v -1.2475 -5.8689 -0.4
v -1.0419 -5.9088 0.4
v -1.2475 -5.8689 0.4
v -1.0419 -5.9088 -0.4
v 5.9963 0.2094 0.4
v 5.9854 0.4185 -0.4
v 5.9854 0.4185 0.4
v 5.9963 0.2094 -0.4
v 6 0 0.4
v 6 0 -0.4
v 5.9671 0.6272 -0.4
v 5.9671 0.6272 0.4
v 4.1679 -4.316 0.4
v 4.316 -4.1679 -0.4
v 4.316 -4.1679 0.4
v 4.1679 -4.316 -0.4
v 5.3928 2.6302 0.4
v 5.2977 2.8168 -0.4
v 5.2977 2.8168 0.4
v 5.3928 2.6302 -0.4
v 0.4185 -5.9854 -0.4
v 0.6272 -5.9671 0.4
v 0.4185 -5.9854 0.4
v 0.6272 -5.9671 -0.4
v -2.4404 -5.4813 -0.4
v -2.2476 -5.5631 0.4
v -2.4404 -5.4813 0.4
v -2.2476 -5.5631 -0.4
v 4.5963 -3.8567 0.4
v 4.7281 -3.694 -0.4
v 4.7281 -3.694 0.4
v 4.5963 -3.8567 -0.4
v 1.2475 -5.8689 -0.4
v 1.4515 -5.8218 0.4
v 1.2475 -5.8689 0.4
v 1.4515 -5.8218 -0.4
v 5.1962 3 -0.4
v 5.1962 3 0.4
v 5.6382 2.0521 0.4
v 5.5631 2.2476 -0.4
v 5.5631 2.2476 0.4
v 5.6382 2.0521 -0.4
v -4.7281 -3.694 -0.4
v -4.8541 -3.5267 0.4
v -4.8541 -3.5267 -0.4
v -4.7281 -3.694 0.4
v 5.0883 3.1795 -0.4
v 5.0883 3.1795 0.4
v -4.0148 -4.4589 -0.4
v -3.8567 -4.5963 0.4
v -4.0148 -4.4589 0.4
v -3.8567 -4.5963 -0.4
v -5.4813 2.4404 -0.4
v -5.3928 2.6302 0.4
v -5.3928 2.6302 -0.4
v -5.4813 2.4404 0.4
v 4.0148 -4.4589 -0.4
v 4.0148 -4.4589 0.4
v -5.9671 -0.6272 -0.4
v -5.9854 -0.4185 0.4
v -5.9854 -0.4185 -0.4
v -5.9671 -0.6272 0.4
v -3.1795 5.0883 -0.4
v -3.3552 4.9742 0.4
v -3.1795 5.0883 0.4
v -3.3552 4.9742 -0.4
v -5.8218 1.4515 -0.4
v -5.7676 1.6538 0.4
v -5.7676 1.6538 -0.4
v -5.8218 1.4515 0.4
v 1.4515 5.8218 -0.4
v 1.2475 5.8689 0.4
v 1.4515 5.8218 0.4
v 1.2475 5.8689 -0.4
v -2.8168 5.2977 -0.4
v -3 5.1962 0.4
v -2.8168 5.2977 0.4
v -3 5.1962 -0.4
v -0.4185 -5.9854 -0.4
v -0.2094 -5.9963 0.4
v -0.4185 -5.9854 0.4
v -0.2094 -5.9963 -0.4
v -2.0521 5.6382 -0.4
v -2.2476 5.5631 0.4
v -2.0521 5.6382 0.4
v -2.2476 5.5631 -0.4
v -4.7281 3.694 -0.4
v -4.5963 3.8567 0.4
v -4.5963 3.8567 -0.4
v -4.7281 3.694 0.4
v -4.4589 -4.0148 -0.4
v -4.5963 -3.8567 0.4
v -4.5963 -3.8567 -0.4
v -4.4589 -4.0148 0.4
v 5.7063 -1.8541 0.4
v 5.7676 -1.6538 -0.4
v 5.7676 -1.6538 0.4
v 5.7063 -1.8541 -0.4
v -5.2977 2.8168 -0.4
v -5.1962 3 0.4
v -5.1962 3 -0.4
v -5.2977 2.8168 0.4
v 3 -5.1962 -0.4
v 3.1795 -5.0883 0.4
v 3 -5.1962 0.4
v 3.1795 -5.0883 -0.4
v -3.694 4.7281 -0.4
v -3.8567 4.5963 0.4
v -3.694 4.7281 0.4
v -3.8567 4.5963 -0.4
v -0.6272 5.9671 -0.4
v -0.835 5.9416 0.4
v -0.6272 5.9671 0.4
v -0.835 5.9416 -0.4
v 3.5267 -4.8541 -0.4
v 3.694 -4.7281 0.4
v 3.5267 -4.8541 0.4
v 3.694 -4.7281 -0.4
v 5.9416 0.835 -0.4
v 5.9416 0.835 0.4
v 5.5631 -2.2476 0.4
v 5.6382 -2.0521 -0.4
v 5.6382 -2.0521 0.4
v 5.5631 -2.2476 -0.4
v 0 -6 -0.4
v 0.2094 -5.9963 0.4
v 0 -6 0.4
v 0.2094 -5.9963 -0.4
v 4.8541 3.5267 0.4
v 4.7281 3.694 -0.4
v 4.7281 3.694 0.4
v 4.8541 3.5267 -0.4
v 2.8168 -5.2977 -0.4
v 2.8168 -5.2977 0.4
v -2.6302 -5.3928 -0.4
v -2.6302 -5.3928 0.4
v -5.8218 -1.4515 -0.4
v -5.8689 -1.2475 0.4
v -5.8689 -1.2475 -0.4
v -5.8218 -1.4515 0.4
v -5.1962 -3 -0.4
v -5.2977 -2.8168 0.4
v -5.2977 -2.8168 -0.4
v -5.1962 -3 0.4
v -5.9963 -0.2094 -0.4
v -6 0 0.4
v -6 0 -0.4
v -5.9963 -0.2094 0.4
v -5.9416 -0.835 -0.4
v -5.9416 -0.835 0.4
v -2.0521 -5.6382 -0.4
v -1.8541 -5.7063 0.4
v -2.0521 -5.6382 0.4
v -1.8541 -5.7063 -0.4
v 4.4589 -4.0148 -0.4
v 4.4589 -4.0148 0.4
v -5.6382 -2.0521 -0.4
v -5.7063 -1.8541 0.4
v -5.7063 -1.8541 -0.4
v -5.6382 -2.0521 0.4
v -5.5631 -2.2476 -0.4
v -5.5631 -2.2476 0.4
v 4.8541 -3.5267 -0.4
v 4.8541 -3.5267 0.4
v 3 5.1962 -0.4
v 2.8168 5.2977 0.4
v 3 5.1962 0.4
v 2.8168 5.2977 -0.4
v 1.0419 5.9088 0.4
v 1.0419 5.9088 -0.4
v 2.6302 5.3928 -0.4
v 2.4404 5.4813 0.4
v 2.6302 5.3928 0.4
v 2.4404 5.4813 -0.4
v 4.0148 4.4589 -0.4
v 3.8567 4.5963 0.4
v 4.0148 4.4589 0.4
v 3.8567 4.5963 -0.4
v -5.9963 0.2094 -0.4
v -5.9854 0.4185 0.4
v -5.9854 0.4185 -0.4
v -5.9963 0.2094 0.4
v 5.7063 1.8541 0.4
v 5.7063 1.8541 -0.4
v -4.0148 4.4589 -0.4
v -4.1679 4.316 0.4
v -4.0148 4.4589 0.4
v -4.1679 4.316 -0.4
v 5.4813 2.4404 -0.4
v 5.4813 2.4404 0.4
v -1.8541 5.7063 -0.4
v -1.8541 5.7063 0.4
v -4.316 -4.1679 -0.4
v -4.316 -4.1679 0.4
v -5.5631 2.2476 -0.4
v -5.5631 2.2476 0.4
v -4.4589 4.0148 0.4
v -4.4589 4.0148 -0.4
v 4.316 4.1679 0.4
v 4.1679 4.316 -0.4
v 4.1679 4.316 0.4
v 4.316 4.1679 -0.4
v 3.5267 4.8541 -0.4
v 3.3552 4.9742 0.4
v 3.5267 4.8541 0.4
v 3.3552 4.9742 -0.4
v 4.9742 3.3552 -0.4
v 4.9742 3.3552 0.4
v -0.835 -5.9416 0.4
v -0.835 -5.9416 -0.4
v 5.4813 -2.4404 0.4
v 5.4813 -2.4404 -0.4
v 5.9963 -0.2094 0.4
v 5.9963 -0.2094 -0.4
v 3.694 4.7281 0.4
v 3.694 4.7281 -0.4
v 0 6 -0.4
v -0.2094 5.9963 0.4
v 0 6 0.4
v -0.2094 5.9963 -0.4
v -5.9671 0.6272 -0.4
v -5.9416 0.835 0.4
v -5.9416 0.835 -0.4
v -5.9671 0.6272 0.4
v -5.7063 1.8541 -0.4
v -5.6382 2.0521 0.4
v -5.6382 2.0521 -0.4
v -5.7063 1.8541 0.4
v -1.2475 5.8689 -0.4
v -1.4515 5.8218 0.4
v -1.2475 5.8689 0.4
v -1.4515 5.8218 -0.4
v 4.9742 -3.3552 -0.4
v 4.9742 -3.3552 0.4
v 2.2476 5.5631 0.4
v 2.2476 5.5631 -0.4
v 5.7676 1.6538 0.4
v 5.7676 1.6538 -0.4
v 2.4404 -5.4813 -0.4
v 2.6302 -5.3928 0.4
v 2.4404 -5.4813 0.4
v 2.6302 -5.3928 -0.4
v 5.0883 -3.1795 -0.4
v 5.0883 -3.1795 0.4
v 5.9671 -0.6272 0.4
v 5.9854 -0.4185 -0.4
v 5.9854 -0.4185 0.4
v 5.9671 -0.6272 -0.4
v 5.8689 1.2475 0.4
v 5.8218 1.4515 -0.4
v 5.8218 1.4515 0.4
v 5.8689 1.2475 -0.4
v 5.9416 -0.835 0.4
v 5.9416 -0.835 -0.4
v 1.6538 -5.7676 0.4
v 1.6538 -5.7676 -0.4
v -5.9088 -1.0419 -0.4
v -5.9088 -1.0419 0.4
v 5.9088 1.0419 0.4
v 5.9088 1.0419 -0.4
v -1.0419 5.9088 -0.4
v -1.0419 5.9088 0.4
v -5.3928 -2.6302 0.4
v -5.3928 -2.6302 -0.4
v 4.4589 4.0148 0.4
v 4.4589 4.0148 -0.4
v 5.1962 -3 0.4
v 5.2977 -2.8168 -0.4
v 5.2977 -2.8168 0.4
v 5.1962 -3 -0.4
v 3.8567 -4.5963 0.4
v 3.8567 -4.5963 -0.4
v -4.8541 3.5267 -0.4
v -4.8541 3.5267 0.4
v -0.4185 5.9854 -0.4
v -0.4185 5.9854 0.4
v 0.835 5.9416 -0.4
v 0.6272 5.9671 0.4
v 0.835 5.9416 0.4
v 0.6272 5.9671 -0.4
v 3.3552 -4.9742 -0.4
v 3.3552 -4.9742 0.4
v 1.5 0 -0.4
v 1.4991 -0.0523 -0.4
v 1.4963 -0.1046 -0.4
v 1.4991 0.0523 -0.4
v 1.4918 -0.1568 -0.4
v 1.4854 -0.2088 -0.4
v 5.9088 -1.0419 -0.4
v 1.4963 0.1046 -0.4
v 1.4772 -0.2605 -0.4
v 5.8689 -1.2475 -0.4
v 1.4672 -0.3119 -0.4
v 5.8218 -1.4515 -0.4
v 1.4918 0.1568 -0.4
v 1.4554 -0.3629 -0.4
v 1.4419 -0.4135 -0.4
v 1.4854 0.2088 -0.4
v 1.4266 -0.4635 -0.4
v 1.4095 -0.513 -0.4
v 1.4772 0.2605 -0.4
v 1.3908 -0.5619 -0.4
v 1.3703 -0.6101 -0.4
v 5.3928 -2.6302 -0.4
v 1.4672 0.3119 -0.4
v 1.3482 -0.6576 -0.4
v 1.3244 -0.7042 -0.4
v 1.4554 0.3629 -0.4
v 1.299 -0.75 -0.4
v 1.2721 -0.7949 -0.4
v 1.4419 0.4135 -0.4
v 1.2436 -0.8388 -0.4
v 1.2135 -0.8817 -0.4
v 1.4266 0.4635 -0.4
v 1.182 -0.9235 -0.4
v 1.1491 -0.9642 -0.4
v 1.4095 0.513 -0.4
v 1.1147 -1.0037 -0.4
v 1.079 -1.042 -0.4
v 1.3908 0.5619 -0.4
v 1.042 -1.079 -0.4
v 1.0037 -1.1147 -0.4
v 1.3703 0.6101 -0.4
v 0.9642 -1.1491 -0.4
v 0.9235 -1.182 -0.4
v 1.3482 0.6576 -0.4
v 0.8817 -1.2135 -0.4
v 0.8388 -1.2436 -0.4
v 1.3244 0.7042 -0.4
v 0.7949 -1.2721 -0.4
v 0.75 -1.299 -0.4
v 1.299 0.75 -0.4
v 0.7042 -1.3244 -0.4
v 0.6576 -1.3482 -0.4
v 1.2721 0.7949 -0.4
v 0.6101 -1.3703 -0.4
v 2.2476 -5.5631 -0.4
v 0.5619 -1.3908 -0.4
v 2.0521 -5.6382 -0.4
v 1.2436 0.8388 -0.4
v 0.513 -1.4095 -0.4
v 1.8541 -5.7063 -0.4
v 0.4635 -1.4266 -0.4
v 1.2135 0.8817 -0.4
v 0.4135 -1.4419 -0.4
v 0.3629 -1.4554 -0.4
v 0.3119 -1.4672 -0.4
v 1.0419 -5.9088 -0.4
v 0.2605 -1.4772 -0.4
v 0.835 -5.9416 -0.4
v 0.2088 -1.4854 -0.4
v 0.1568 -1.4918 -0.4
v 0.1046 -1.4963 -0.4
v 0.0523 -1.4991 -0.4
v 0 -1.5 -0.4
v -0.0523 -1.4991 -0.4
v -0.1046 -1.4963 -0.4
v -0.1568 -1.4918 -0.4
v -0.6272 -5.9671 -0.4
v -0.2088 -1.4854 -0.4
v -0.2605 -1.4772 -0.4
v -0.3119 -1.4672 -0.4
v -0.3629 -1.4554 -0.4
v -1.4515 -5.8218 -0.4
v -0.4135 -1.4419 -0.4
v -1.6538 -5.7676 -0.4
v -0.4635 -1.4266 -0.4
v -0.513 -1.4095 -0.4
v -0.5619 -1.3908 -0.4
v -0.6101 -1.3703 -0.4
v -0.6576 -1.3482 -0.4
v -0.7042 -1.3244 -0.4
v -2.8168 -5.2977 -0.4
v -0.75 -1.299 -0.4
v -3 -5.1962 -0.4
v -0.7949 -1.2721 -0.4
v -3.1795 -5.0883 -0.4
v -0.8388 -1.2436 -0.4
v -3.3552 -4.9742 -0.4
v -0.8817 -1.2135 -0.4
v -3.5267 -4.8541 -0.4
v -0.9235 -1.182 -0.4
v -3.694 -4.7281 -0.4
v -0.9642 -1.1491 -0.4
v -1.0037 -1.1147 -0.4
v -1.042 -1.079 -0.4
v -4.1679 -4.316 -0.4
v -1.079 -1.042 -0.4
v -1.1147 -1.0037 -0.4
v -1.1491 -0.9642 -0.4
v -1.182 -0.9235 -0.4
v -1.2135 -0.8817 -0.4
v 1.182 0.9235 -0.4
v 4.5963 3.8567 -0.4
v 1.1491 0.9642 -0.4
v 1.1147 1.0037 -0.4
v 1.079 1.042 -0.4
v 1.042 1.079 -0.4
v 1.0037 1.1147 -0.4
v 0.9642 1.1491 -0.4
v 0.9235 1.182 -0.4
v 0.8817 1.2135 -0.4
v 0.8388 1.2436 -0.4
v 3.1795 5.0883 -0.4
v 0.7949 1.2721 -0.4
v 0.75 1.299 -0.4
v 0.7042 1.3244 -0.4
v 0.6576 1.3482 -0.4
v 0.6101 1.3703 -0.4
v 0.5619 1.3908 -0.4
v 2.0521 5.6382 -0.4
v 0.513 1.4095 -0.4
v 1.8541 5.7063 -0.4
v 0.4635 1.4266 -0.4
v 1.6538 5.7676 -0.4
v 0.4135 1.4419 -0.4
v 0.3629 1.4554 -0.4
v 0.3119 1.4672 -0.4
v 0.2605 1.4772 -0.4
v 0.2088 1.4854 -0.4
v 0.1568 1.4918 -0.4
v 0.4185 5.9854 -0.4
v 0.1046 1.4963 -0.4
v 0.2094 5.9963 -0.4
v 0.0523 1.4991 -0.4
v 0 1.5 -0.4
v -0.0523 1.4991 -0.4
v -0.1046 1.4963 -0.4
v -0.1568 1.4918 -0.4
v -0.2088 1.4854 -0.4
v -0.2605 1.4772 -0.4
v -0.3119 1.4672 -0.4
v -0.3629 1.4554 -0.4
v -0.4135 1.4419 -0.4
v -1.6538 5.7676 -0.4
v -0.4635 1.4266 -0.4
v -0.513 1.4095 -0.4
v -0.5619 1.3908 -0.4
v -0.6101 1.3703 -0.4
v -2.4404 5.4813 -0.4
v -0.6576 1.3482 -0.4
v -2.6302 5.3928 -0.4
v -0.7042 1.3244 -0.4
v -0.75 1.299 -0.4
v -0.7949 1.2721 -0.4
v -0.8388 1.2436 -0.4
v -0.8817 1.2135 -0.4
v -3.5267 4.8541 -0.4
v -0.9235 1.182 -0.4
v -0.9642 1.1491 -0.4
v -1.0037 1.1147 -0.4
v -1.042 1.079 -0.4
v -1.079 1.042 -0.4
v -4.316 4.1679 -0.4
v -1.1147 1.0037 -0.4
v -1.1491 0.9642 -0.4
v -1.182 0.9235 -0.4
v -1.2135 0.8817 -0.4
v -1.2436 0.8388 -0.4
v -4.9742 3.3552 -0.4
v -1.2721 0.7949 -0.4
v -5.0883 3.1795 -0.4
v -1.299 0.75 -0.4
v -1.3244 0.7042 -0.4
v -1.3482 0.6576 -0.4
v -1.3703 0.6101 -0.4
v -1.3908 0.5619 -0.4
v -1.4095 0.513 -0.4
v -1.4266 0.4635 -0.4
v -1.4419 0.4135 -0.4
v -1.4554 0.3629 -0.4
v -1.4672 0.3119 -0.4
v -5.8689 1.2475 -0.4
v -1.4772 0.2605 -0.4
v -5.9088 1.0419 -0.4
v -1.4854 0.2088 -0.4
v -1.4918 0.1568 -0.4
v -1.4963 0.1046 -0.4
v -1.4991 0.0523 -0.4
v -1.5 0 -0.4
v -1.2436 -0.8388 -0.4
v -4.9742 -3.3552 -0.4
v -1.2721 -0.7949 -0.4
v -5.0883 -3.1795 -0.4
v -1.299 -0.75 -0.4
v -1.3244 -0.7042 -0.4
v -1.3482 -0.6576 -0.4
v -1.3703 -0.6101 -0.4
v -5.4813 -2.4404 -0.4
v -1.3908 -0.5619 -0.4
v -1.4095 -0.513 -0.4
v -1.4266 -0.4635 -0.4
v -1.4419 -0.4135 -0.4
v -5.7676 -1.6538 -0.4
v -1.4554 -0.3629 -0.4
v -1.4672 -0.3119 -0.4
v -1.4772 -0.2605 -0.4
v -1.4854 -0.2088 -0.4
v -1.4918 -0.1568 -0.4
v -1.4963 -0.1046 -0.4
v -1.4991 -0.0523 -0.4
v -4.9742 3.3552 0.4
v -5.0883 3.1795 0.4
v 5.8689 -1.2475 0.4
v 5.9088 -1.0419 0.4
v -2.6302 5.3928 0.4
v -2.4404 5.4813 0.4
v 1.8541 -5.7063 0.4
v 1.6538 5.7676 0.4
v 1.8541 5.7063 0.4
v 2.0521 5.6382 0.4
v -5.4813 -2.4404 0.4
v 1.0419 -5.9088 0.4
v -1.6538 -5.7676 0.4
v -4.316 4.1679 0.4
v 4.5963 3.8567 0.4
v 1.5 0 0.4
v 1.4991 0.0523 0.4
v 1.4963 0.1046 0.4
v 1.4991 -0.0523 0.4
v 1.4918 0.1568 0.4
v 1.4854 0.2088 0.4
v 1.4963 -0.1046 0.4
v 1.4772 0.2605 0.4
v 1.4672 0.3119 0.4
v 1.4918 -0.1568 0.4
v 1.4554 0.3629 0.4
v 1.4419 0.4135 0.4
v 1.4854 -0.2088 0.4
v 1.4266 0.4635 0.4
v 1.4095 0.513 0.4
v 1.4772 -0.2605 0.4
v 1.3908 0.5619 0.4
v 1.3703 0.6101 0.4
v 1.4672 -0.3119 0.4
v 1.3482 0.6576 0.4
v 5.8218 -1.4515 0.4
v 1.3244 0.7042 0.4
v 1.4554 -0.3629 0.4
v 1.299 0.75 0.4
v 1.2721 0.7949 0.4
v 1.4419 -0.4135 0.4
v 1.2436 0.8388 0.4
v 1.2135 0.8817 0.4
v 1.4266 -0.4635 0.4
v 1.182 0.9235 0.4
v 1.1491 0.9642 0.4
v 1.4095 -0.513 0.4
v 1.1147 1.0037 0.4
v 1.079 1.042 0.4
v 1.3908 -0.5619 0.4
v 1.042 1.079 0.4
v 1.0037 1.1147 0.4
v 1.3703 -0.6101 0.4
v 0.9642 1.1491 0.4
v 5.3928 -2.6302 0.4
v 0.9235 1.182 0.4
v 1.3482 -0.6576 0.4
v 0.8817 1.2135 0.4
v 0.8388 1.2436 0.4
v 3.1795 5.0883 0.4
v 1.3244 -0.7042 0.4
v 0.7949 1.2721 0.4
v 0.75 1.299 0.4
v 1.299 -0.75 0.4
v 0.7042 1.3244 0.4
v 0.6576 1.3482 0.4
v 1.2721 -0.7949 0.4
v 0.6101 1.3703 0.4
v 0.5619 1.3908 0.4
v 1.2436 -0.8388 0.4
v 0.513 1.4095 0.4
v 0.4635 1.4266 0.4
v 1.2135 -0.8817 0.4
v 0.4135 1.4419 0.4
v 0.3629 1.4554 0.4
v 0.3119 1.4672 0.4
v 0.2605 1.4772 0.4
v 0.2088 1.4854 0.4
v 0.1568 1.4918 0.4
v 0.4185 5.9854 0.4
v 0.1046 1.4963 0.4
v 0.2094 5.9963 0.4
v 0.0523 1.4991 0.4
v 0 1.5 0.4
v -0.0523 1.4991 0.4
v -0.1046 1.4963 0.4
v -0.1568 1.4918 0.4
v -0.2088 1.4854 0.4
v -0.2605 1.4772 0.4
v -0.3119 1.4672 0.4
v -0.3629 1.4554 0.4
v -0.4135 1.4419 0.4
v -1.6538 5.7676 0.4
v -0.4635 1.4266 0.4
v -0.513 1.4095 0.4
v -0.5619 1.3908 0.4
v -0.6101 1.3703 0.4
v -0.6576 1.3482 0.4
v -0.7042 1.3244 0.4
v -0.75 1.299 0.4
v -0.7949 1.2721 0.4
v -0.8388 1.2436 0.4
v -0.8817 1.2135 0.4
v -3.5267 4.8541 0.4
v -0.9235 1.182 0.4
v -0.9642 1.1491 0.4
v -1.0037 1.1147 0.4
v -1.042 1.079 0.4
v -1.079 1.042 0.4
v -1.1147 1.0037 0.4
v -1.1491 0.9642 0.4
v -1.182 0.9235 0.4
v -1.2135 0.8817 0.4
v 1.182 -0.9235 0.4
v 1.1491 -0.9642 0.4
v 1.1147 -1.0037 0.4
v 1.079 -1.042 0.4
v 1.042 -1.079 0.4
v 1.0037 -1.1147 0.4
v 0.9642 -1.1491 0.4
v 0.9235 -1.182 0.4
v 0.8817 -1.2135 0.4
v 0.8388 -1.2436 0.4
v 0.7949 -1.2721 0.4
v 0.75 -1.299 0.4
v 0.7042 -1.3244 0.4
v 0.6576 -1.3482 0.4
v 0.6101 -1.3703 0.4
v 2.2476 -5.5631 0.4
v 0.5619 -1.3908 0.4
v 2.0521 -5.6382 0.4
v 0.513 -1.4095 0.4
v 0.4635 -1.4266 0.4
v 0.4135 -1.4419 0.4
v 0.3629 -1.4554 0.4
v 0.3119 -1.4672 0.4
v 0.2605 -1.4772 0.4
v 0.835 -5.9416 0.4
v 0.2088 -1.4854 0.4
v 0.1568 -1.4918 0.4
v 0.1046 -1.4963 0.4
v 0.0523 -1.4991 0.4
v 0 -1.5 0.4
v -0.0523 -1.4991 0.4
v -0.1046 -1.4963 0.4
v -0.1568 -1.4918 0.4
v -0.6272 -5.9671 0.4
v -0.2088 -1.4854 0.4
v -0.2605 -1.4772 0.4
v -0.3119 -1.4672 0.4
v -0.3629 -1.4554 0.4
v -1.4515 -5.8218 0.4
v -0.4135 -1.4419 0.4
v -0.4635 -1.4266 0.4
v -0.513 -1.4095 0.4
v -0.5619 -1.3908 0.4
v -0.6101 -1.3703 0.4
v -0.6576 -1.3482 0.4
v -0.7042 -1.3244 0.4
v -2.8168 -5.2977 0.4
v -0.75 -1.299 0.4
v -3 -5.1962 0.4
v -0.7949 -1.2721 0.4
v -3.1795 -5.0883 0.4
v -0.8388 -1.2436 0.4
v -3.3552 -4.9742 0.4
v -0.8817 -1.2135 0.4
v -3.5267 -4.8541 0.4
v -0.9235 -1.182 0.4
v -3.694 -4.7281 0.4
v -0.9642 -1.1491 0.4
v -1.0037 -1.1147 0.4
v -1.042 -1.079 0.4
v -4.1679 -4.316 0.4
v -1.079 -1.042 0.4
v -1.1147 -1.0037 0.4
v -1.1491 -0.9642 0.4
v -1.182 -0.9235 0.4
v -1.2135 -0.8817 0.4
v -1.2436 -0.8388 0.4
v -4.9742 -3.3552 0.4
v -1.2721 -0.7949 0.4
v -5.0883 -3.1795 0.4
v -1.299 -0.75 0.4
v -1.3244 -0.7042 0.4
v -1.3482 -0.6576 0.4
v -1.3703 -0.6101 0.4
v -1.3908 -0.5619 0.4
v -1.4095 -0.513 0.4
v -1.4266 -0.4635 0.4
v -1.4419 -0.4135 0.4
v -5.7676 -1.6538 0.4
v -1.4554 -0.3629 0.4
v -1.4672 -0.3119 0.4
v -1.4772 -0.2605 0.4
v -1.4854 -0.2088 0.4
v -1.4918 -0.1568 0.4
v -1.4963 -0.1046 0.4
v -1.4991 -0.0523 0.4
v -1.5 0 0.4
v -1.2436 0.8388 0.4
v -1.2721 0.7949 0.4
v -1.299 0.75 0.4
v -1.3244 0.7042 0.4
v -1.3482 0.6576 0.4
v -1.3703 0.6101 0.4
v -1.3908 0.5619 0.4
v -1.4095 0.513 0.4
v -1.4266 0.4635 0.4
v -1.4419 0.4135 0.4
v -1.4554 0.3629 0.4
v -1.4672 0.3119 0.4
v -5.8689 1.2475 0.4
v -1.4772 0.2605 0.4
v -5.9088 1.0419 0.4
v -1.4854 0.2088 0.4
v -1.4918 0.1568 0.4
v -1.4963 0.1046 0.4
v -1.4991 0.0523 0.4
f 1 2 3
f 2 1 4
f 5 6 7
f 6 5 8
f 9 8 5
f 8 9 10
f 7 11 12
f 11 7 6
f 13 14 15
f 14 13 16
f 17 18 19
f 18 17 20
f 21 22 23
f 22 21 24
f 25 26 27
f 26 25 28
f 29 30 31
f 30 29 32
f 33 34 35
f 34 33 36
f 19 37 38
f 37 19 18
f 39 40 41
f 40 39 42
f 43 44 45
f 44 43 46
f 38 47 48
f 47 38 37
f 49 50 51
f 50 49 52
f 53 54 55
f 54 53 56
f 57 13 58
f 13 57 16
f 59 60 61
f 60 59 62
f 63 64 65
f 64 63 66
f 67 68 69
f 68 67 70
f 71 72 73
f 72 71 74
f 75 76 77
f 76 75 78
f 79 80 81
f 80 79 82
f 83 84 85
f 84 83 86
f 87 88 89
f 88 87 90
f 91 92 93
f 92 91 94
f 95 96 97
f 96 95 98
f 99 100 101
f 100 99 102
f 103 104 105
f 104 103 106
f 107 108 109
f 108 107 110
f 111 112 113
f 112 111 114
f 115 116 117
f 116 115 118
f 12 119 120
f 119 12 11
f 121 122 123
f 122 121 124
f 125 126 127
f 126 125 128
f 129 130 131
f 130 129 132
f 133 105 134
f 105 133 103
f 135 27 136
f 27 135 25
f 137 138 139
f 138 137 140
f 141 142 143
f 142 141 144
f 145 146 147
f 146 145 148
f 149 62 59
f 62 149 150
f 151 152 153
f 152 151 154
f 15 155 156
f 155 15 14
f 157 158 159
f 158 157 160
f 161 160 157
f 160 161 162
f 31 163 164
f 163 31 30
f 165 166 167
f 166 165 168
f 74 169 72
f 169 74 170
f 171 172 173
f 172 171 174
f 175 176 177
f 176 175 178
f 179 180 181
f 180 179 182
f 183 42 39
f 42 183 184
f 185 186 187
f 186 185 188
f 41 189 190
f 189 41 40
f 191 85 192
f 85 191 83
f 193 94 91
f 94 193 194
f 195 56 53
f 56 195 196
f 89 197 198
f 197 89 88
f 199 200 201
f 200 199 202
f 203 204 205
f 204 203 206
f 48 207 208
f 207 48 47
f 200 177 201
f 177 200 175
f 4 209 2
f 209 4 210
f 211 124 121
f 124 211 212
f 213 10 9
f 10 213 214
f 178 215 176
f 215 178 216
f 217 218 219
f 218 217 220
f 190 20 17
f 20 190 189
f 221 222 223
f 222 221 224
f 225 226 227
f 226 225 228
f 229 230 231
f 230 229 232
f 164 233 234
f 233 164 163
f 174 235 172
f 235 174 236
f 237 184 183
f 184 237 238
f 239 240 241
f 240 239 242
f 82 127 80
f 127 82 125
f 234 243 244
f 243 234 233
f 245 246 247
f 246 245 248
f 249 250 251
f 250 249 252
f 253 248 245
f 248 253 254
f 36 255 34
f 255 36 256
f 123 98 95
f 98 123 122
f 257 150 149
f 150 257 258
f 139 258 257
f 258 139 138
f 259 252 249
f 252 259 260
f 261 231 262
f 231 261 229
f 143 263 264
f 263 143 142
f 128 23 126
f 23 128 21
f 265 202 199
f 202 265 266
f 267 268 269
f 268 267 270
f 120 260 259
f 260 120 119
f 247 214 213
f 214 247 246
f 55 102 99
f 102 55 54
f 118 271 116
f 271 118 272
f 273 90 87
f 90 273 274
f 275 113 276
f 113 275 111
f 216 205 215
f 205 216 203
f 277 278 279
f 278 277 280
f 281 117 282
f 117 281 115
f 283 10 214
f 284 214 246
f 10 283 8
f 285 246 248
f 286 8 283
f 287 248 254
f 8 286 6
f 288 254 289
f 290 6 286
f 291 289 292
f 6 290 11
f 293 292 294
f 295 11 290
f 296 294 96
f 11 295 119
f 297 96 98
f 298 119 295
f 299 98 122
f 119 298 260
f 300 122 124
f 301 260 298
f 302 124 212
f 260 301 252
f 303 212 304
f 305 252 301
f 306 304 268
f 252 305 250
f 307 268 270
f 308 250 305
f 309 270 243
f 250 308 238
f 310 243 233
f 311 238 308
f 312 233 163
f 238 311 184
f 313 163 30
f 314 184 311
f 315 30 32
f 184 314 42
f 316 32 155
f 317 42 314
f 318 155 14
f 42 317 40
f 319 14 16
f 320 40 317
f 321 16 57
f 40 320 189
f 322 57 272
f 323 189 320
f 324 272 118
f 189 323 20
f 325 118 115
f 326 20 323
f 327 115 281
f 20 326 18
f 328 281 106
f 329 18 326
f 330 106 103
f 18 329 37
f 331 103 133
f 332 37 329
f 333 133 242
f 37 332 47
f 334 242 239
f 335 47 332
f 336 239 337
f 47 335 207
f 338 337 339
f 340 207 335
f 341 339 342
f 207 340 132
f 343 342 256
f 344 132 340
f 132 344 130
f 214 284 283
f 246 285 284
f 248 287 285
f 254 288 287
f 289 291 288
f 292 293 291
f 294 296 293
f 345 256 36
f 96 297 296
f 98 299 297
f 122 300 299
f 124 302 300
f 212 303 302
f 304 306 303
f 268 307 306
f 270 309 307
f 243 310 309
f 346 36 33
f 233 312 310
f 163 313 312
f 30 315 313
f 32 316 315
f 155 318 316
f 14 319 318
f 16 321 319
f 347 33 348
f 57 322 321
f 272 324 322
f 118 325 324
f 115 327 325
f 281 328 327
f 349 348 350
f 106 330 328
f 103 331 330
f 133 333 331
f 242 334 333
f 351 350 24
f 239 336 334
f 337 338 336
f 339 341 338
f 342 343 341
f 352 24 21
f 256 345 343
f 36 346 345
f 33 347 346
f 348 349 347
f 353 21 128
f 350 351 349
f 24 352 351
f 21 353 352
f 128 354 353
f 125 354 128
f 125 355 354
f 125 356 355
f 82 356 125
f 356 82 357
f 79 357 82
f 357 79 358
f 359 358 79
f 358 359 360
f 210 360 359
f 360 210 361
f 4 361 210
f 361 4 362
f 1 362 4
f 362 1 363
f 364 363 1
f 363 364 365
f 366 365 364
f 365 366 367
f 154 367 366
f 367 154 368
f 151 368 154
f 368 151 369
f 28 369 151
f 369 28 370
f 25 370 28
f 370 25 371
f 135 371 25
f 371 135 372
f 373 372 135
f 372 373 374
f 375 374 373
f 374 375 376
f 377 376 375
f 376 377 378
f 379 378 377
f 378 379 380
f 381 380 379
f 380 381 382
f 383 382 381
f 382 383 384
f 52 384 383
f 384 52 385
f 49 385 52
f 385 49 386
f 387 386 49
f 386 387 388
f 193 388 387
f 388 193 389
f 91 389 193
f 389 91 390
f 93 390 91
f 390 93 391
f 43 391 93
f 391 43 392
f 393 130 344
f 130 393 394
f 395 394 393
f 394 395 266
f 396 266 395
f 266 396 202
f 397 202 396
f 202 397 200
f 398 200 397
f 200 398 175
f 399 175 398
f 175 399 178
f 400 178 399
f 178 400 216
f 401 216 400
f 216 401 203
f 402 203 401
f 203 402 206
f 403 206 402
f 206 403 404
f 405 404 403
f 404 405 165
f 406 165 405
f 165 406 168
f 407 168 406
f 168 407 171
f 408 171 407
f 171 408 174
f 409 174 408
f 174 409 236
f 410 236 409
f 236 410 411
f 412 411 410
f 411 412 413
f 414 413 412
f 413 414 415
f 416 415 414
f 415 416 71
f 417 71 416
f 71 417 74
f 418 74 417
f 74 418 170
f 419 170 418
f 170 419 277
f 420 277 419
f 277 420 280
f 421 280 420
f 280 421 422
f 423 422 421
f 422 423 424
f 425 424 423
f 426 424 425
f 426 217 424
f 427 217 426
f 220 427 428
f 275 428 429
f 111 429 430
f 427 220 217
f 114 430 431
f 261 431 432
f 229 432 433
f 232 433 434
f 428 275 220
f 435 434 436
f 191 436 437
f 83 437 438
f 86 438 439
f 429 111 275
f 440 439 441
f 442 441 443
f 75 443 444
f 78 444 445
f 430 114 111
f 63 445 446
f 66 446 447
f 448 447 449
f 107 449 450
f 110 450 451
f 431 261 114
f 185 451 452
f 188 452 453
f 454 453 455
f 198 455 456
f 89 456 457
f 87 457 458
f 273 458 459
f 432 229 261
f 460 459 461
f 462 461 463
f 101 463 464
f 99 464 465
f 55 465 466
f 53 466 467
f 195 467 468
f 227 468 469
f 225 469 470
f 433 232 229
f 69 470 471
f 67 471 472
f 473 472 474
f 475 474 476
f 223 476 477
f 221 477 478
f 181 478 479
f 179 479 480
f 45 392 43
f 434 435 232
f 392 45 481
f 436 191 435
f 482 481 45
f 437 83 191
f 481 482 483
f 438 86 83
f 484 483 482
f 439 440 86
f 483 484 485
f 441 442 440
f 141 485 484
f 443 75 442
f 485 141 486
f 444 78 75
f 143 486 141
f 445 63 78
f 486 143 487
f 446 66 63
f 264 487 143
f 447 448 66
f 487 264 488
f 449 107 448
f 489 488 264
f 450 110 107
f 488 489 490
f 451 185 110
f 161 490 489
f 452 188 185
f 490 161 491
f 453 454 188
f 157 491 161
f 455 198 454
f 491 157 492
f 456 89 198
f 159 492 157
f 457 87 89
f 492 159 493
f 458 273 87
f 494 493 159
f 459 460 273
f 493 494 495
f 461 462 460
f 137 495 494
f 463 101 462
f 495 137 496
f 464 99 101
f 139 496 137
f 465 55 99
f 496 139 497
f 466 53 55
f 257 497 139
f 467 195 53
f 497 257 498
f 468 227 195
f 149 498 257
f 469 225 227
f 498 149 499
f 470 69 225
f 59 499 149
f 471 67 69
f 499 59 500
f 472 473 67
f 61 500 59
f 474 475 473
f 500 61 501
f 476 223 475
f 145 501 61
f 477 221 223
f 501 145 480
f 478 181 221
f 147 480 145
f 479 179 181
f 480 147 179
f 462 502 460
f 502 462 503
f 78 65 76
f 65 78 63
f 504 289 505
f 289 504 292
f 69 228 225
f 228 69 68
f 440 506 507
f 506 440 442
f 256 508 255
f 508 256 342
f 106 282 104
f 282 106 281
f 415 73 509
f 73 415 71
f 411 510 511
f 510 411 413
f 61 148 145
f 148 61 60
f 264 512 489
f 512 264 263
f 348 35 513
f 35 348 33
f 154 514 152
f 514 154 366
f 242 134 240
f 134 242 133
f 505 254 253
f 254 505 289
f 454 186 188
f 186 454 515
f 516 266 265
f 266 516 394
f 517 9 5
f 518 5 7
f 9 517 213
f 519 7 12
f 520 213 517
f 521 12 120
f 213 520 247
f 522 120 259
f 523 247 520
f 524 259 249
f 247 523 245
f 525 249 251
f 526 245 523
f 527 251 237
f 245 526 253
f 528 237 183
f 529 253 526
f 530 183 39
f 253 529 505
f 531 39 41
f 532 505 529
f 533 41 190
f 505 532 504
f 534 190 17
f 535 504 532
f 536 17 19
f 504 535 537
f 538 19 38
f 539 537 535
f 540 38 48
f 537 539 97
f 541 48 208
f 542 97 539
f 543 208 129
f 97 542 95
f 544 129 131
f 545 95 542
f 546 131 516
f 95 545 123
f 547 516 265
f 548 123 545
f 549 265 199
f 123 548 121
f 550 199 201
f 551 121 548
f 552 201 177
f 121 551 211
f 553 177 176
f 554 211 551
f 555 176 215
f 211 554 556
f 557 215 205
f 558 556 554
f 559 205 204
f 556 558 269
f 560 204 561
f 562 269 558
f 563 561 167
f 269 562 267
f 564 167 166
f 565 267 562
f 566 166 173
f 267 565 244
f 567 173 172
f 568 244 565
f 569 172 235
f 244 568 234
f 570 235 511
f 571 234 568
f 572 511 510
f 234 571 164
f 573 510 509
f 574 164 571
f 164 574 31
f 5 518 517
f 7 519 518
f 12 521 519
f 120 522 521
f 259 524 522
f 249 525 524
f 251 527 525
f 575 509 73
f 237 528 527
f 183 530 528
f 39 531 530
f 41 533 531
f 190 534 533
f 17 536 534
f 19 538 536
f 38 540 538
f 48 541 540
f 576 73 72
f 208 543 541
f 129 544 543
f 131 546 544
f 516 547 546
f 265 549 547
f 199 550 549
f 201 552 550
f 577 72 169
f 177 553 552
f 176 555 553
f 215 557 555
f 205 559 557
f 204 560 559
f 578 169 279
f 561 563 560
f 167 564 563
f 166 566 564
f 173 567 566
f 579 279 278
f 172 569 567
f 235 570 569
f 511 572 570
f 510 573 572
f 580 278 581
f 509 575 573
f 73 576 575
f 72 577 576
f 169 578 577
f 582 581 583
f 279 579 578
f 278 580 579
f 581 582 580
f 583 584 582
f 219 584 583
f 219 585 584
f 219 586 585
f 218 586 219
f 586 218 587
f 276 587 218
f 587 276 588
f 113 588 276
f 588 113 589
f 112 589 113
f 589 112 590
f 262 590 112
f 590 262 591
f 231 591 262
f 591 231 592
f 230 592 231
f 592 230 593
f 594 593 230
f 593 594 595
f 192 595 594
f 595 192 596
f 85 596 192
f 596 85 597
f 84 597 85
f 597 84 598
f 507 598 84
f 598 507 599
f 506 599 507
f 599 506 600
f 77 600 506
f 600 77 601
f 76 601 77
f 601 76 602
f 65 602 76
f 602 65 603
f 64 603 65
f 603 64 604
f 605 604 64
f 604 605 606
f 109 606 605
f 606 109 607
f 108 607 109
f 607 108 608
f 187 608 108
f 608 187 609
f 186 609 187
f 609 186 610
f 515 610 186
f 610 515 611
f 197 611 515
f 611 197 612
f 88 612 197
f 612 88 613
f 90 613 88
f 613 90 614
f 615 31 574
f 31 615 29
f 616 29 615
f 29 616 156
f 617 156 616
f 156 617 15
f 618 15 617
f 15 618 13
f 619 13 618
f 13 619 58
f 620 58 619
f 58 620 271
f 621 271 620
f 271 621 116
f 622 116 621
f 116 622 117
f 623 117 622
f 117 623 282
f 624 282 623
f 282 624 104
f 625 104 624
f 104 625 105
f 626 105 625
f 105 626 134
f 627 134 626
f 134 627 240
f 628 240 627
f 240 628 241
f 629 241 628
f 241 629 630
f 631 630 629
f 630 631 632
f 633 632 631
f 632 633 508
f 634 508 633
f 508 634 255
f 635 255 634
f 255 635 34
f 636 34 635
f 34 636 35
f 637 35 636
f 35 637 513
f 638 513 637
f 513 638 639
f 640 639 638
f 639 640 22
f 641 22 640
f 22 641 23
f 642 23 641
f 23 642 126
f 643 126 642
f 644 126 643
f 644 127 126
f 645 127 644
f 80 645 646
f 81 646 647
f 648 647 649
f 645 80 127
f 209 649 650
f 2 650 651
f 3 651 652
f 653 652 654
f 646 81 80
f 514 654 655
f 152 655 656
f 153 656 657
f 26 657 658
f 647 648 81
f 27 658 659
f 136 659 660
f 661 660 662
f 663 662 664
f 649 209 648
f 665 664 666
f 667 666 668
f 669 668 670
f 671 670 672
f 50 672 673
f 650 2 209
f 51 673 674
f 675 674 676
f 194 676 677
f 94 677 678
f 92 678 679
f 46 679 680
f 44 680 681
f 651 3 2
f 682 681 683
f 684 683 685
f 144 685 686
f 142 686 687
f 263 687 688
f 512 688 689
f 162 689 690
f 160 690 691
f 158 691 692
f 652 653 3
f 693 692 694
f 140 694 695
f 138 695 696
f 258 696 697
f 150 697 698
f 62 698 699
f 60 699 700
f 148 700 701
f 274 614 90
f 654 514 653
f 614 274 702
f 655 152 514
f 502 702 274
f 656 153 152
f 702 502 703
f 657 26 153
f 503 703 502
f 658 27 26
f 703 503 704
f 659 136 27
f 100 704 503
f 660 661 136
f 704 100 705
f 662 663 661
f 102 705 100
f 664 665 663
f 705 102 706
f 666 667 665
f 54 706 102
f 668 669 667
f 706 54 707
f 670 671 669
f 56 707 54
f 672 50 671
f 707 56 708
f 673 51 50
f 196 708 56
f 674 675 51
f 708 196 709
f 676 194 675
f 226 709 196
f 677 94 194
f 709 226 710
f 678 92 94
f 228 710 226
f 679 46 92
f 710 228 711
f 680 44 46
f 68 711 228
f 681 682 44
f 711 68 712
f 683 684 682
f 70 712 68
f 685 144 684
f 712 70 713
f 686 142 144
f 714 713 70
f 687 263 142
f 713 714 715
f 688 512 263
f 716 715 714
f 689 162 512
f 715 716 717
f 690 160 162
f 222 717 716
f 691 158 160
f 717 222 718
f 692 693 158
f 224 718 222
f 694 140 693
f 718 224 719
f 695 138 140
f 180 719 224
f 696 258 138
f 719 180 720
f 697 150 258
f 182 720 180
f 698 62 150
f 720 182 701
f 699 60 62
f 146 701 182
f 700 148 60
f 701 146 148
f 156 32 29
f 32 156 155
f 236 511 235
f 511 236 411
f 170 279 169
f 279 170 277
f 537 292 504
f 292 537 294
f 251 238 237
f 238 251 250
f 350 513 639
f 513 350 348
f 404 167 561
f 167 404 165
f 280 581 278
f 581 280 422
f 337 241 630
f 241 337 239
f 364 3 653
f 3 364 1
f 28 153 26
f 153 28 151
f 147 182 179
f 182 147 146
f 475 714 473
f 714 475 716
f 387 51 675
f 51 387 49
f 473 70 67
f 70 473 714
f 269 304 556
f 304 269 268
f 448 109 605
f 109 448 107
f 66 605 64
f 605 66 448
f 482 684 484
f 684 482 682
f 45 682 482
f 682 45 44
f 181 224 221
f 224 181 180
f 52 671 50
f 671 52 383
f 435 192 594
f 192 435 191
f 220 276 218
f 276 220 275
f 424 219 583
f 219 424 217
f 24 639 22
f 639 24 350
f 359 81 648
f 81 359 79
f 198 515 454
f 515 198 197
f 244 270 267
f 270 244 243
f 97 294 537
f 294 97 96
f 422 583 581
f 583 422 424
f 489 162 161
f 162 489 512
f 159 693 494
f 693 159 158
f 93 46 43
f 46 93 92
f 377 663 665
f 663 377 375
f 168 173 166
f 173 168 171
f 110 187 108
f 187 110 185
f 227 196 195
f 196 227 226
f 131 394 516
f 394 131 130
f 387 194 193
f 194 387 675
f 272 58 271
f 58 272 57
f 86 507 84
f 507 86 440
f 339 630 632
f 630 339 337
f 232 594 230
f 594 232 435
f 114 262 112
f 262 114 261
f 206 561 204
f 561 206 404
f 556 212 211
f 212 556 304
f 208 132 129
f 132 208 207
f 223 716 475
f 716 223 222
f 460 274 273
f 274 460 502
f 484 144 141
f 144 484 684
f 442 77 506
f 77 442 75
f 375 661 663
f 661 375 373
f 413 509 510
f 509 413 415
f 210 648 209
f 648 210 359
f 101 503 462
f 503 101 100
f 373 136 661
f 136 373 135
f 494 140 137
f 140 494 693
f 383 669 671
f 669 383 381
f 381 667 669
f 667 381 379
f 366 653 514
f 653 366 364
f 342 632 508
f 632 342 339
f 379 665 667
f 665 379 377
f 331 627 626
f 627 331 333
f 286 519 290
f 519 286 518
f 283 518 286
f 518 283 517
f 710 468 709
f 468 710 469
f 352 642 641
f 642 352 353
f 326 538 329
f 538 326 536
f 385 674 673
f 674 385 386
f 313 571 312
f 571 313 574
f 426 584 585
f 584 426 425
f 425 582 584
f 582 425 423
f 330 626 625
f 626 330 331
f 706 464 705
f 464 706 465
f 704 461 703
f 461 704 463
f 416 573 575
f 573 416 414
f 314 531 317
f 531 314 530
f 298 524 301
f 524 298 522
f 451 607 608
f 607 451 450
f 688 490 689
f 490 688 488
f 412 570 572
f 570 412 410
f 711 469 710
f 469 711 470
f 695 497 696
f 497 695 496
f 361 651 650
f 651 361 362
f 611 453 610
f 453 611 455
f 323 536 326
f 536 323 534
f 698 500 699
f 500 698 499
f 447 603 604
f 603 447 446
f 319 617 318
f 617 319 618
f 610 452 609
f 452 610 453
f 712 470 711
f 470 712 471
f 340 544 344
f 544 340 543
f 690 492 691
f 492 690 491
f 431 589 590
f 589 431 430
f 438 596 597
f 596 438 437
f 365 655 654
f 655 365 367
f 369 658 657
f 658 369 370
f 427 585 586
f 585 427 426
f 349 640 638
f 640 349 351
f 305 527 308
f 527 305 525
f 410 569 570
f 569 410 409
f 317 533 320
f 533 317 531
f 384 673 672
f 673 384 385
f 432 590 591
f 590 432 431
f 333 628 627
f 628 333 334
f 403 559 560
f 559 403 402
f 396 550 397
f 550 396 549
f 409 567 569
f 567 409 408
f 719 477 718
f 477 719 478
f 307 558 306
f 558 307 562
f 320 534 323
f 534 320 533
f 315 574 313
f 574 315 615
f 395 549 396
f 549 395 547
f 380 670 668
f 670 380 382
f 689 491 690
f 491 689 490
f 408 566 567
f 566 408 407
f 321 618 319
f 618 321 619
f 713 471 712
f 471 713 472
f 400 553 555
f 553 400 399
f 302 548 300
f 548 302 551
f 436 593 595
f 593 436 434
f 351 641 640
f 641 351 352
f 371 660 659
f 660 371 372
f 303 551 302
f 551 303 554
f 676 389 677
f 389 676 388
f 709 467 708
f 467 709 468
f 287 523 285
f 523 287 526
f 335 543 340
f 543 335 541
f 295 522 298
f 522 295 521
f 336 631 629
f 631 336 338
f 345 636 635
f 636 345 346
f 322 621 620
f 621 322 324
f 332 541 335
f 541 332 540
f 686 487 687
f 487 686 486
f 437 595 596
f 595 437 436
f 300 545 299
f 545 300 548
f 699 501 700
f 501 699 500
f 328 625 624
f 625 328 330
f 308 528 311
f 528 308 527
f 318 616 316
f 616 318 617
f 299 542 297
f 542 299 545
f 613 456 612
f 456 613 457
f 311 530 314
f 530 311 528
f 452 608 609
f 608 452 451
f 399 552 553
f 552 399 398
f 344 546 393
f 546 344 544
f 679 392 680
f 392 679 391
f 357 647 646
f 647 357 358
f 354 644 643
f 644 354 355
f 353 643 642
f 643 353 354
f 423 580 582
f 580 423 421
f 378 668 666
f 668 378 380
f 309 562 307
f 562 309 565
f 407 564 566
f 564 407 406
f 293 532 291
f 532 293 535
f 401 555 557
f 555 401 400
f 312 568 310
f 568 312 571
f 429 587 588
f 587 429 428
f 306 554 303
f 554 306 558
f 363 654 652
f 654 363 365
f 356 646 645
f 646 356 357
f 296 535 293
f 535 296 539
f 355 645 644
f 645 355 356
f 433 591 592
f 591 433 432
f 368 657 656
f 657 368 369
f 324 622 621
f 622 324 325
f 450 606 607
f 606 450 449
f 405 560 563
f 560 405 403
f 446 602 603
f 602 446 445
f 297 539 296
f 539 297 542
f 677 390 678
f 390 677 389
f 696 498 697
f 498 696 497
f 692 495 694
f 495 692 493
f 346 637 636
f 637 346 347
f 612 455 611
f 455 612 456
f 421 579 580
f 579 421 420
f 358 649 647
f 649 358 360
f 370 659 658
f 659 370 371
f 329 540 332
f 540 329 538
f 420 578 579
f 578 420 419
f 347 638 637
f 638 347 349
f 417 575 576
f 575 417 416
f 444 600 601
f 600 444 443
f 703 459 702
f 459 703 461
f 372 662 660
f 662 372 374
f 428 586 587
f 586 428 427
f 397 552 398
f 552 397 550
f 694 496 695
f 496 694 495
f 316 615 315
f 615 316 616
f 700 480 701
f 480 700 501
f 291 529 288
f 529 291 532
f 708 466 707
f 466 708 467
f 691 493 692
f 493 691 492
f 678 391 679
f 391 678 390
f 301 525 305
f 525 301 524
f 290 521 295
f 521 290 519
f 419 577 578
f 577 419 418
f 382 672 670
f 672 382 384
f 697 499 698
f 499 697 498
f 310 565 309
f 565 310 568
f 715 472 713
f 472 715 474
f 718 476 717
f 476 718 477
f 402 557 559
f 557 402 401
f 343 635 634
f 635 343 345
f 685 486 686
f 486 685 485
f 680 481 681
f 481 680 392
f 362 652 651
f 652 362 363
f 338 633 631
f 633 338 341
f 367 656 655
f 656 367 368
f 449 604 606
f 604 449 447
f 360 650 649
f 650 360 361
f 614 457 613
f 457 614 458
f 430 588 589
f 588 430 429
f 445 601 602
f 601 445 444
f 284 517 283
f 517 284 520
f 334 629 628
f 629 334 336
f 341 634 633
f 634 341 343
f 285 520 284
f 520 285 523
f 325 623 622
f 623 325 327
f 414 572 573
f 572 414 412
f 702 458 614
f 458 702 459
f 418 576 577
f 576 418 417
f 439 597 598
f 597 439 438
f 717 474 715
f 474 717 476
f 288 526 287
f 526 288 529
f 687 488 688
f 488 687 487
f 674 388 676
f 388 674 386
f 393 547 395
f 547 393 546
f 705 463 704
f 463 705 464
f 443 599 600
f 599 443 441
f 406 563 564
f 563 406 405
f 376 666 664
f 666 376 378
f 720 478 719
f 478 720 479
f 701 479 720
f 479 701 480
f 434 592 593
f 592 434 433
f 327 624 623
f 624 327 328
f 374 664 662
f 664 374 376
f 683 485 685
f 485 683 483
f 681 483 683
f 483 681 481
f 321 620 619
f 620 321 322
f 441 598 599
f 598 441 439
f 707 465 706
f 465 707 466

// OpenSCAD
// Penny washer: 3.0mm ID, 12.0mm OD, 0.8mm thickness

outer_diameter = 12.0;   // mm
inner_diameter = 3.0;    // mm
thickness      = 0.8;    // mm

// Smoothness (prevents faceted/polygonal circles)
$fa = 2;
$fs = 0.05;

module washer(od, id, h) {
    difference() {
        cylinder(d=od, h=h, center=true);
        cylinder(d=id, h=h + 0.2, center=true); // slight extra height ensures clean through-hole
    }
}

washer(outer_diameter, inner_diameter, thickness);
